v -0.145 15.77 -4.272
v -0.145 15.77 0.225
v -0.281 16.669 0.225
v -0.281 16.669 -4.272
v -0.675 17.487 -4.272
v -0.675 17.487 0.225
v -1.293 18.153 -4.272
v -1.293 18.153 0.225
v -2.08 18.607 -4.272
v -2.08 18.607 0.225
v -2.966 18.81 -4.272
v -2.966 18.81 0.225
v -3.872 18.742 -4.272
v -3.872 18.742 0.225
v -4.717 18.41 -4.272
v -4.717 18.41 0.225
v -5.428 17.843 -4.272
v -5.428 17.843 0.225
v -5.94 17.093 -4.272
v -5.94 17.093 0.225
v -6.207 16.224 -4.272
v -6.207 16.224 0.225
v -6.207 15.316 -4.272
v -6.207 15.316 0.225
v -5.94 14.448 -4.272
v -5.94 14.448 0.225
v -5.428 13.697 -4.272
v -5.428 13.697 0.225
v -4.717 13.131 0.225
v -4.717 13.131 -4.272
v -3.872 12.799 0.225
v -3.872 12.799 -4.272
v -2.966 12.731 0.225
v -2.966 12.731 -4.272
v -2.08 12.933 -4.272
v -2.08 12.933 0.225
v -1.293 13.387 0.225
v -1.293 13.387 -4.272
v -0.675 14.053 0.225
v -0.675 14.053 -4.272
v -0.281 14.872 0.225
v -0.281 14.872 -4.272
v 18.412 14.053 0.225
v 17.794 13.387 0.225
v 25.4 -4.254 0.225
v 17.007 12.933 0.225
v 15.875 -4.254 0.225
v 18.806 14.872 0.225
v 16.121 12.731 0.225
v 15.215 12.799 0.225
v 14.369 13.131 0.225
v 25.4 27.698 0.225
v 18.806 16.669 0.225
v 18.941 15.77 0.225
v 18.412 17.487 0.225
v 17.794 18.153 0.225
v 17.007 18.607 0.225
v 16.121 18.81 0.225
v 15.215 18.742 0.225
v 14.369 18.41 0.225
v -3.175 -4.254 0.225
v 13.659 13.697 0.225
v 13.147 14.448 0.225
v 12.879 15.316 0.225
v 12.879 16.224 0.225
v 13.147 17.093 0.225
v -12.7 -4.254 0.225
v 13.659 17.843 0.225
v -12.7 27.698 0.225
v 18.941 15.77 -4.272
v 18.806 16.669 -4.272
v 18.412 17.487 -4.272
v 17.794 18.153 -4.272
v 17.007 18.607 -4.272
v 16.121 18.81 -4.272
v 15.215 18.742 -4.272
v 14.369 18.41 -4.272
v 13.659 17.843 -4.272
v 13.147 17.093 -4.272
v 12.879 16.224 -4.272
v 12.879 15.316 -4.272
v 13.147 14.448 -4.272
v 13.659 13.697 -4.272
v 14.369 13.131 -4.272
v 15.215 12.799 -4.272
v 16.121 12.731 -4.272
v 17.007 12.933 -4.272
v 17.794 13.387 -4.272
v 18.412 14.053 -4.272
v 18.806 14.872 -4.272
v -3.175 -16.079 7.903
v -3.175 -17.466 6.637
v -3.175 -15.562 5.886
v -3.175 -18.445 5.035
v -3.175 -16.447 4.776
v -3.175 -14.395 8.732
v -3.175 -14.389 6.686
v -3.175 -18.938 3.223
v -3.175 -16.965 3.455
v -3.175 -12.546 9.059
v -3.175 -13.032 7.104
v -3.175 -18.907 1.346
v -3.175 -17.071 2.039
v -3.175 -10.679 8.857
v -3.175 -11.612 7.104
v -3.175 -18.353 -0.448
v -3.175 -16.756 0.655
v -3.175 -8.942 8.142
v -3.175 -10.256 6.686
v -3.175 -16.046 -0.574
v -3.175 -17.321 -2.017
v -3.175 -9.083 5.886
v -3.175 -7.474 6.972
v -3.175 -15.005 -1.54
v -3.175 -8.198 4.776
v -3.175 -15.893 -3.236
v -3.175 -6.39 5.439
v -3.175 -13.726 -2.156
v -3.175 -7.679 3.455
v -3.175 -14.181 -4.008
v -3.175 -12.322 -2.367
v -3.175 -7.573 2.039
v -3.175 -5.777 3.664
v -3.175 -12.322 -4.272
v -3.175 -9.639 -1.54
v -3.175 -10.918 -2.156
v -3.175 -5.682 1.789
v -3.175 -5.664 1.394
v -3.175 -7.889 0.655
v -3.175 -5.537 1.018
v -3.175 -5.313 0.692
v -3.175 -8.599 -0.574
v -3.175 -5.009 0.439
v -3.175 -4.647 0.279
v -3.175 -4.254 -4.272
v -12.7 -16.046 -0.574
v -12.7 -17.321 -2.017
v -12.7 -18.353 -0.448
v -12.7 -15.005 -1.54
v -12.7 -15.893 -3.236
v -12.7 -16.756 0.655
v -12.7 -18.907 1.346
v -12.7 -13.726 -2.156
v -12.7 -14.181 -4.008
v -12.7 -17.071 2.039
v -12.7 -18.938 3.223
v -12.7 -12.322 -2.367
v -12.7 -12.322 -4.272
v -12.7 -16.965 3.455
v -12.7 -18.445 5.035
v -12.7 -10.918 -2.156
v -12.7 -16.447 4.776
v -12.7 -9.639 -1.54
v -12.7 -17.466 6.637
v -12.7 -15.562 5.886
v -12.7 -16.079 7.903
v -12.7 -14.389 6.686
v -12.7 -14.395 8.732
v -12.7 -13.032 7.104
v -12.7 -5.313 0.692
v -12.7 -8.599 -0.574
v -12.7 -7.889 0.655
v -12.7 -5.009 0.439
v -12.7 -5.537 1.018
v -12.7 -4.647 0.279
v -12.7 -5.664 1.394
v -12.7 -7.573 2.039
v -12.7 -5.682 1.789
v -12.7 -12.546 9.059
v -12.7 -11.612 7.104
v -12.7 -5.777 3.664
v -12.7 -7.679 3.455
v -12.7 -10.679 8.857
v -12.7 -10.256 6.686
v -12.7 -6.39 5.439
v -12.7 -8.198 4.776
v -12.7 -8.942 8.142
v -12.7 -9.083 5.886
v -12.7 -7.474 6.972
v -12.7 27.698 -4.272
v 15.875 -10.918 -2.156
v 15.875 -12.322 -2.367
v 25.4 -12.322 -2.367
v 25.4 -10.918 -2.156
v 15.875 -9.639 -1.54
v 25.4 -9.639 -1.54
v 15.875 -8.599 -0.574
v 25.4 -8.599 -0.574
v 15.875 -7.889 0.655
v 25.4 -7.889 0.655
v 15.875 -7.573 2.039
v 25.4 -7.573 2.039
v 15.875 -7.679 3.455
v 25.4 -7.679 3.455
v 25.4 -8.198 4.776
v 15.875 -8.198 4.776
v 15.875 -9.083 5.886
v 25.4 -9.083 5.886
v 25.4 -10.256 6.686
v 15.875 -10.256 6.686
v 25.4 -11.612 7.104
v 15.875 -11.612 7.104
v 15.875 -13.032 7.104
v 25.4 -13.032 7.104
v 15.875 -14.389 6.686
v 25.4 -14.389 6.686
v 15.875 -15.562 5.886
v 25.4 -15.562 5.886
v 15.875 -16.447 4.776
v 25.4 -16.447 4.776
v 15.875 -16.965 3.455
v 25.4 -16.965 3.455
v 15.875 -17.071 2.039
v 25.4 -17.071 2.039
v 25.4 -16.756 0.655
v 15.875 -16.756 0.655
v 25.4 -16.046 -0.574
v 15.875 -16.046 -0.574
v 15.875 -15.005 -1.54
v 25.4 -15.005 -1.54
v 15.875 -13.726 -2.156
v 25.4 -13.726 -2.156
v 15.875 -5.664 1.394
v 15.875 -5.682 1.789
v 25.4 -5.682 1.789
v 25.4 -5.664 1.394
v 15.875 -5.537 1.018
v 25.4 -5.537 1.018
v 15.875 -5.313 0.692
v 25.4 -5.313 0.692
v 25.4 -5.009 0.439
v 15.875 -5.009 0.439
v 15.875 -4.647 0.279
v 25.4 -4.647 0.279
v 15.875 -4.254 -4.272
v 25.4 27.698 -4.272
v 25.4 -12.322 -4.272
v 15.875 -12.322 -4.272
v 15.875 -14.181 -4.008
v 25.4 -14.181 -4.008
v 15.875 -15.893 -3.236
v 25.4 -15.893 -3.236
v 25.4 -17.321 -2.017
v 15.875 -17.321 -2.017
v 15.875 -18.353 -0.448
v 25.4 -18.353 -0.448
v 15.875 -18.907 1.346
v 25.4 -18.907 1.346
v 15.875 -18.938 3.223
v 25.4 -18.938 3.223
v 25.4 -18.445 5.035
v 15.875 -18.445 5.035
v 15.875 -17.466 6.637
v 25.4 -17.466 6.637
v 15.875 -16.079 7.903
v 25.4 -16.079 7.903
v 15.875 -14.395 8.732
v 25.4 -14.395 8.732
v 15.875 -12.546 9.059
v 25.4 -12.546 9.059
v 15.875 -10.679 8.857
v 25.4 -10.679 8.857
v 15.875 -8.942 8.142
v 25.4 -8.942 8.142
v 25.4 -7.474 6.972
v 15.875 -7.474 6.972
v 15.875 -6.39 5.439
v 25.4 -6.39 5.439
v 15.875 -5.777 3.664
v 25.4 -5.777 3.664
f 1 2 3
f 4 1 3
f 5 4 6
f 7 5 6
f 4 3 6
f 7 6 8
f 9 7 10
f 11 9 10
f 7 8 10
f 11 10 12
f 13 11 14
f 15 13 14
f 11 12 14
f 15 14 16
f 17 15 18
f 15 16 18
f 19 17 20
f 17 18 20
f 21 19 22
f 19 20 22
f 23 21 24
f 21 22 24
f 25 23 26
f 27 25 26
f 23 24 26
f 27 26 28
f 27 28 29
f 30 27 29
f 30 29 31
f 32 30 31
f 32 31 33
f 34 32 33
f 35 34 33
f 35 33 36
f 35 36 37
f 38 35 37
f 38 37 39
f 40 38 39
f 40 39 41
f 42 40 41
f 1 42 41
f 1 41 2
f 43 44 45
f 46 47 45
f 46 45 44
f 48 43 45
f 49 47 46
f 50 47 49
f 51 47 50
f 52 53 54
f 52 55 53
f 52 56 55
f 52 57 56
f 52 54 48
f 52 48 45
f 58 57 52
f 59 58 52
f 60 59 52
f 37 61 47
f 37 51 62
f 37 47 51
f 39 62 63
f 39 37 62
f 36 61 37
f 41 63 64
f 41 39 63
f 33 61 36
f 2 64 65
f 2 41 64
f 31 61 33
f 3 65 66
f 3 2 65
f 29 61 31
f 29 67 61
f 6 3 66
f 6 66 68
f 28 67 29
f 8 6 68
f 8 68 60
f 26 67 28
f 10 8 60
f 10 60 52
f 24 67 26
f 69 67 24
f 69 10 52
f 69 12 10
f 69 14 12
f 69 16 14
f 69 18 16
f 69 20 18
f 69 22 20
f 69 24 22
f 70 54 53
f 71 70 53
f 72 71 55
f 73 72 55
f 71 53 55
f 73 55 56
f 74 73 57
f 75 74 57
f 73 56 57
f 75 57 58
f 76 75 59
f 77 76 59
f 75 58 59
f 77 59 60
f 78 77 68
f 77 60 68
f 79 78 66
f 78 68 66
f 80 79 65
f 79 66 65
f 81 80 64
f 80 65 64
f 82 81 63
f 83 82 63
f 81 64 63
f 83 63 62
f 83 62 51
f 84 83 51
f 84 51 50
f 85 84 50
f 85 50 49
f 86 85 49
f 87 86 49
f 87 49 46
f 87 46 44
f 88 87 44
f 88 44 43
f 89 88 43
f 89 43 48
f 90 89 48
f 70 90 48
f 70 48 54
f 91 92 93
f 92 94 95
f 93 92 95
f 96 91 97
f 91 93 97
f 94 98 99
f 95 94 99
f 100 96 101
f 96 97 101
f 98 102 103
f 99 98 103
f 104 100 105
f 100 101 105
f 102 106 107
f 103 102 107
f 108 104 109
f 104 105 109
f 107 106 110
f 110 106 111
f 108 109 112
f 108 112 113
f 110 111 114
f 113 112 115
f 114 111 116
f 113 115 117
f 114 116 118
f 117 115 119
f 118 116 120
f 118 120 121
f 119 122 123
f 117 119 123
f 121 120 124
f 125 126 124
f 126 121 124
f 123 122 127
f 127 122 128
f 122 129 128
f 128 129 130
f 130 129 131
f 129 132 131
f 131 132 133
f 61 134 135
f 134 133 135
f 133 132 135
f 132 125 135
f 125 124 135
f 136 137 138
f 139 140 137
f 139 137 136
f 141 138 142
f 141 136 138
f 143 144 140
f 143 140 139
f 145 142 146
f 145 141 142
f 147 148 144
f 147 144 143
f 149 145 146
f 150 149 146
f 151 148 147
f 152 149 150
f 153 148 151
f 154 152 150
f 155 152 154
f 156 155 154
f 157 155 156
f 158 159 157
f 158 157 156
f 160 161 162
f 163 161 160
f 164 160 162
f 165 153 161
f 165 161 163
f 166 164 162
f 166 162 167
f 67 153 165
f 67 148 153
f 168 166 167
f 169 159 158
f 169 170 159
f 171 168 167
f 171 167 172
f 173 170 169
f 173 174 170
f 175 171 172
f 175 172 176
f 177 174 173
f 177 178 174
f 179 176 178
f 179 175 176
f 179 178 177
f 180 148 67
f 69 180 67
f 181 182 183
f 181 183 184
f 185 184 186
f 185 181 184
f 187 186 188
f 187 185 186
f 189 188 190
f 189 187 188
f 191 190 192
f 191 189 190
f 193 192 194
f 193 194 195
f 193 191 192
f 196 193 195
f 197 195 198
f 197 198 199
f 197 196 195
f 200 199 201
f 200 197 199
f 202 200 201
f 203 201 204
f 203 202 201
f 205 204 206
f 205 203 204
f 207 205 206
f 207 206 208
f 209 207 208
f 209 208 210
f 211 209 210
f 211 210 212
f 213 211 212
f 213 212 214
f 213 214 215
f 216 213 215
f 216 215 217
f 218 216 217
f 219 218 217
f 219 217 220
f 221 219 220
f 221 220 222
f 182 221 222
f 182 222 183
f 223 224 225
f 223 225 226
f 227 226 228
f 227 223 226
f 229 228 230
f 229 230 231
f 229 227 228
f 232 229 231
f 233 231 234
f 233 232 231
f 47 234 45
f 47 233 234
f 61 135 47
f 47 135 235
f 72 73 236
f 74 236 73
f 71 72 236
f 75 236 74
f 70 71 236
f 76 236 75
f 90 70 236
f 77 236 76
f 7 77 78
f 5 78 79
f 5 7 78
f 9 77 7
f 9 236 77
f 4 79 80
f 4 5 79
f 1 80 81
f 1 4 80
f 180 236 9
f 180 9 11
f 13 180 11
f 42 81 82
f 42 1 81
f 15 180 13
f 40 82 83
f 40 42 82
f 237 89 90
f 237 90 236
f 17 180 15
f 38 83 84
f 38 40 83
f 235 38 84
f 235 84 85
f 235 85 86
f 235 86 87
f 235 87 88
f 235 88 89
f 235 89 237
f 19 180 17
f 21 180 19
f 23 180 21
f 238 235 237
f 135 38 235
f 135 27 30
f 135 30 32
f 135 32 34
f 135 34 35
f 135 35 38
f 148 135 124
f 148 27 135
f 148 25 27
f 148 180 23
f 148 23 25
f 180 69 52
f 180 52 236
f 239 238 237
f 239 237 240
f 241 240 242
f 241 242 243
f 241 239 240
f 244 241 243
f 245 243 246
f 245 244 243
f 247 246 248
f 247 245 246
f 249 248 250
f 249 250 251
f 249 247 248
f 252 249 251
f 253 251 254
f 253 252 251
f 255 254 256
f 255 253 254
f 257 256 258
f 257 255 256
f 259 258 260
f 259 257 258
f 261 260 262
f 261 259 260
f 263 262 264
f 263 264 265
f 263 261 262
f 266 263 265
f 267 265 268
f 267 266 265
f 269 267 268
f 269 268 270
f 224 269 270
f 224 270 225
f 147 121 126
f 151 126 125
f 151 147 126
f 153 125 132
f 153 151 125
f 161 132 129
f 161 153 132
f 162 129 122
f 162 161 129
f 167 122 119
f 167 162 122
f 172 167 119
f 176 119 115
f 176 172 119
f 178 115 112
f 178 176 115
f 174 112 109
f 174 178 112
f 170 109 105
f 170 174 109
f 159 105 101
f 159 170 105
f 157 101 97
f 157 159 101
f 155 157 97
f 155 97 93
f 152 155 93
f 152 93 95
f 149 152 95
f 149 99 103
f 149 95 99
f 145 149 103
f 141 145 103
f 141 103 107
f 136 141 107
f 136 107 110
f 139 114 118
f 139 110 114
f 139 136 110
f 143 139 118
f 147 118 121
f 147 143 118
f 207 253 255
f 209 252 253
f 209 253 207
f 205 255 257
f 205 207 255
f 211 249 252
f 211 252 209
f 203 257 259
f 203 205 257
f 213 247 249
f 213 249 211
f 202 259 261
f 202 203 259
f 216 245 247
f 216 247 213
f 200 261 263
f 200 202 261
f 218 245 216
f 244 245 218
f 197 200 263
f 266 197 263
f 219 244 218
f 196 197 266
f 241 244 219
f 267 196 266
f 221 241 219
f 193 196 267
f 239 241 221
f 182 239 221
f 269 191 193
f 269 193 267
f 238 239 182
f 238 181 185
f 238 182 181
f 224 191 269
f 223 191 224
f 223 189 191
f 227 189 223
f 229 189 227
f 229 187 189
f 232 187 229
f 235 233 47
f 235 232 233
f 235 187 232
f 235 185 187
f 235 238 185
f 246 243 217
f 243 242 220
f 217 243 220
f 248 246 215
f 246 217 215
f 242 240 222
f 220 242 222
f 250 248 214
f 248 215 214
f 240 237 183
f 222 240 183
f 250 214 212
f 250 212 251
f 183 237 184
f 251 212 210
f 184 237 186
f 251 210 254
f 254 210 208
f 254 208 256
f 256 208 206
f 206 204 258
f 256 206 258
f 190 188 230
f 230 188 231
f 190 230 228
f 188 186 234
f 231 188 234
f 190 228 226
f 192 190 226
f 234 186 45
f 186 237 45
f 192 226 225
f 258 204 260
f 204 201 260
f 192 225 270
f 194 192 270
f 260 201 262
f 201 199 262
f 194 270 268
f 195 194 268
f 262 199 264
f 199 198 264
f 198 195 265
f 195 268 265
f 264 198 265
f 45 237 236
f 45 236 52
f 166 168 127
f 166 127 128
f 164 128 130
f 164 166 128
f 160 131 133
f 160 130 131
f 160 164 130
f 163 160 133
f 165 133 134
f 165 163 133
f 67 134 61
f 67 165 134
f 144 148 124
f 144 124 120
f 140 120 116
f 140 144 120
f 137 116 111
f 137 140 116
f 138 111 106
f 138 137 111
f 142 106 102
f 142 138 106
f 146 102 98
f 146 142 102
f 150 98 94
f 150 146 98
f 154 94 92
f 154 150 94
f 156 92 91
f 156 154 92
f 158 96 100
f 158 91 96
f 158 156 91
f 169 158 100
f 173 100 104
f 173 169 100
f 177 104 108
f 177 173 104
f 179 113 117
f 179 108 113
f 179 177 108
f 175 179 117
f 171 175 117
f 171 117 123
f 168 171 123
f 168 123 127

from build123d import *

# Parameters (mm, degrees)
SKETCH2_R               = 1.5875
BOSS_EXTRUDE1_DEPTH     = 12.7
SKETCH3_R               = 1.016
CUT_EXTRUDE1_DEPTH      = 12.7
CUT_EXTRUDE3_DEPTH      = 5.08
CUT_EXTRUDE3_DEPTH_BACK = 50.8
SKETCH4_W               = 6.35
SKETCH4_H               = 4.911764537
SCALE1_SCALE            = 3


with BuildPart() as part:
    # Sketch2 → Boss-Extrude1 (new body)
    with BuildSketch(Plane(origin=(0, 0, 0), x_dir=(0, 0, -1), z_dir=(1, 0, 0))):
        with BuildLine():
            Line((0.7234417, 2.689264537), (0.7234417, 13.340138709))
            Line((0.7234417, 13.340138709), (2.2225, 13.340138709))
            Line((2.2225, 13.340138709), (2.2225, 0))
            ThreePointArc((2.2225, 0), (-1.641425032, -1.498409194), (0.202045455, 2.213297062))
            ThreePointArc((0.202045455, 2.213297062), (0.567726646, 2.33627761), (0.7234417, 2.689264537))
        make_face()
        Circle(SKETCH2_R, mode=Mode.SUBTRACT)
    extrude(amount=BOSS_EXTRUDE1_DEPTH)

    # Sketch3 → Cut-Extrude1 (cut)
    with BuildSketch(Plane.XY.offset(-0.7234417)):
        with Locations((3.168860155, 9.364146191)):
            Circle(SKETCH3_R)
        with Locations((9.531139845, 9.364146191)):
            Circle(SKETCH3_R)
    extrude(amount=-CUT_EXTRUDE1_DEPTH, mode=Mode.SUBTRACT)

    # Sketch4 → Cut-Extrude3 (cut, two sides: drawn at the far end of the back side and taken through both)
    with BuildSketch(Plane.XY.offset(-0.7234417).offset(-CUT_EXTRUDE3_DEPTH_BACK)):
        with Locations((6.35, 0.233382268)):
            Rectangle(SKETCH4_W, SKETCH4_H)
    extrude(amount=CUT_EXTRUDE3_DEPTH + CUT_EXTRUDE3_DEPTH_BACK, mode=Mode.SUBTRACT)


with BuildPart() as part_1:
    # Scale1: scaled about (6.35, 6.161123686, -1.197561497)
    add(part.part.scale(SCALE1_SCALE).moved(Location((-12.7, -12.322247372, 2.395122994))))


solid = part_1.part
